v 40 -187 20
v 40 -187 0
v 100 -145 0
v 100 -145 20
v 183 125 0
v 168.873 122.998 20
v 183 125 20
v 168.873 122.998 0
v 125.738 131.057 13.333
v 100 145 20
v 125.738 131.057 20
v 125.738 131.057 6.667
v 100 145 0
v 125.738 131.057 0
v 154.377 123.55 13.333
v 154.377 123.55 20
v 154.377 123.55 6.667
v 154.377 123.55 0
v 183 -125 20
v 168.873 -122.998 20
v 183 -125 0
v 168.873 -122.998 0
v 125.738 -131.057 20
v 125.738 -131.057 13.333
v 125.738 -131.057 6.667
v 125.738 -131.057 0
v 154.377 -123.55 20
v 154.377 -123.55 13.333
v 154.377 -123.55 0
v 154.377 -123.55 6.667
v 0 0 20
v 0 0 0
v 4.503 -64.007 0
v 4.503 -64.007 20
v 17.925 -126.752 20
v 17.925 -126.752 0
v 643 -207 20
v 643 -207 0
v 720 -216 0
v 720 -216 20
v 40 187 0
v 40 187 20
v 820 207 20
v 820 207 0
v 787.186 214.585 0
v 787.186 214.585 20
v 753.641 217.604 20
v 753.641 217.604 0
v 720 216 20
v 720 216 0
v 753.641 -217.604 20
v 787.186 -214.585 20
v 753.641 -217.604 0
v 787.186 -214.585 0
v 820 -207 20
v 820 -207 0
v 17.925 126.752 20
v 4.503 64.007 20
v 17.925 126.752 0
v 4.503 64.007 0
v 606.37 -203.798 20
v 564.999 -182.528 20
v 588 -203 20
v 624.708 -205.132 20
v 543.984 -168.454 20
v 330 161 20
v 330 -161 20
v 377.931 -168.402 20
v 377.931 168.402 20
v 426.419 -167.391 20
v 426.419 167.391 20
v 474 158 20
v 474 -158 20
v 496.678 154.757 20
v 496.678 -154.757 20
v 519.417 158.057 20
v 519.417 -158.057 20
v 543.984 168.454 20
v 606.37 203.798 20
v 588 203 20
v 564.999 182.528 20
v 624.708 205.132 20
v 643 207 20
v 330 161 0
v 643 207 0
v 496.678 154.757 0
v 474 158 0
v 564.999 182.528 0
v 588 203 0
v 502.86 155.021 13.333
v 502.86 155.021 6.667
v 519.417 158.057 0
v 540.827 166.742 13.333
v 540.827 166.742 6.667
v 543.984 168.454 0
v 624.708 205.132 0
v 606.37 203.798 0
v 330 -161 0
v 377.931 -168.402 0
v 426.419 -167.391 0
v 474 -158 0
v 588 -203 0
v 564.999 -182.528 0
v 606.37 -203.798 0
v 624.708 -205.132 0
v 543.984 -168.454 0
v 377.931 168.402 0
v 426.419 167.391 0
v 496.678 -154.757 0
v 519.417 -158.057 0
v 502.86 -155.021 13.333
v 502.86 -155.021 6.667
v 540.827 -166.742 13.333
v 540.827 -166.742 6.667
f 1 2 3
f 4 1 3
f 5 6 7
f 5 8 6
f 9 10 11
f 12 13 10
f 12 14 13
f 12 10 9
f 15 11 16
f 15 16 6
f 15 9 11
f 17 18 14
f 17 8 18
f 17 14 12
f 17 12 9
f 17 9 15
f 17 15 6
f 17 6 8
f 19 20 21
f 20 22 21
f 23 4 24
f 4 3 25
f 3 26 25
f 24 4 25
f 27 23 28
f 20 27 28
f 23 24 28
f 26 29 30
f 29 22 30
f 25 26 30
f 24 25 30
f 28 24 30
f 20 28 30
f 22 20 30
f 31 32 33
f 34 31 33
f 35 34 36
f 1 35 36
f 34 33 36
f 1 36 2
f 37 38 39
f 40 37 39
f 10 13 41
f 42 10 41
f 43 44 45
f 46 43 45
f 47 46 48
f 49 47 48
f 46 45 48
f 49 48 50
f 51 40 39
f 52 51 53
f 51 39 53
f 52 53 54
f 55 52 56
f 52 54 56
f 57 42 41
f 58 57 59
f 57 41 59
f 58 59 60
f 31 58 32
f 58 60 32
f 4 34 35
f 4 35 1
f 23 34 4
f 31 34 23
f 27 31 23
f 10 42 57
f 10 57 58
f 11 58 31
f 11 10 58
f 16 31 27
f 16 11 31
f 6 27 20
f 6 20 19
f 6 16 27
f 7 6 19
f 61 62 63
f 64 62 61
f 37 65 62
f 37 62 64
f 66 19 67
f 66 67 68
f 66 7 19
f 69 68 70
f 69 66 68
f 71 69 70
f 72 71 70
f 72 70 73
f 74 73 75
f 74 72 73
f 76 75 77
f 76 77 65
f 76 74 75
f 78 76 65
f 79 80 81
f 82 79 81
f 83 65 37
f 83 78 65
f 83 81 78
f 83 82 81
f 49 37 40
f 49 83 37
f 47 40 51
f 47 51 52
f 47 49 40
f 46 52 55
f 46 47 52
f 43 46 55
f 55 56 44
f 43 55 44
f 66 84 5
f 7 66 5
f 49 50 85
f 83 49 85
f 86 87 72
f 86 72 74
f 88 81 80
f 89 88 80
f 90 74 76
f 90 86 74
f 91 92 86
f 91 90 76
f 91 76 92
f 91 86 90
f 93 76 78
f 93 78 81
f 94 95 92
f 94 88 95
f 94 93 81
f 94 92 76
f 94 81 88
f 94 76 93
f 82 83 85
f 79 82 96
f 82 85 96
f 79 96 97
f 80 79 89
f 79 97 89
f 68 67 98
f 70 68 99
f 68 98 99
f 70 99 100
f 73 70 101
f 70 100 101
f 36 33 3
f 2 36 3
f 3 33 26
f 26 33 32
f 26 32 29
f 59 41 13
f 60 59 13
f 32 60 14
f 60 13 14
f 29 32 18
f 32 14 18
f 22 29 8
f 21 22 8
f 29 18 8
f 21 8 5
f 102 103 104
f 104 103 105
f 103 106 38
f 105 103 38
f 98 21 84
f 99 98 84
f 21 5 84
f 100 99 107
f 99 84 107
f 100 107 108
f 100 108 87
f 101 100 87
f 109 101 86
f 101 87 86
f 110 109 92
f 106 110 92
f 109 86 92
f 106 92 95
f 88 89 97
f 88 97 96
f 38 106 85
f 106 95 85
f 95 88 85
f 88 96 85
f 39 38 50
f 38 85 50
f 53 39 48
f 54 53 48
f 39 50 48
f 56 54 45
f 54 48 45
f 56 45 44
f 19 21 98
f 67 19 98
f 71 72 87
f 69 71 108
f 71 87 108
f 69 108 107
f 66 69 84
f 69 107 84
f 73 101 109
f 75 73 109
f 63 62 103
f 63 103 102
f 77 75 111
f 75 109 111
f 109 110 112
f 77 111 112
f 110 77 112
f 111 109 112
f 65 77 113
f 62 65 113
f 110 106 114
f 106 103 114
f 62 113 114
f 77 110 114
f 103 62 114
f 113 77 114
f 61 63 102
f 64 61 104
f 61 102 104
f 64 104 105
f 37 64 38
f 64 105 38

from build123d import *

# Parameters (mm, degrees)
F1_DEPTH = 20


with BuildPart() as f1:
    # F0 (on Top) → F1 (new body)
    with BuildSketch(Plane.XY):
        with BuildLine():
            ThreePointArc((40, 187), (10.111843, 95.615114), (0, 0))
            Line((0, 0), (100, 0))
            Line((100, 0), (100, 145))
            Line((100, 145), (40, 187))
        make_face()
        with BuildLine():
            Line((100, 0), (0, 0))
            ThreePointArc((0, 0), (10.111843, -95.615114), (40, -187))
            Line((40, -187), (100, -145))
            Line((100, -145), (100, 0))
        make_face()
        with BuildLine():
            Line((100, 145), (100, 0))
            Line((100, 0), (183, 0))
            Line((183, 0), (183, 125))
            add(Edge.make_bspline(
                [(100, 145), (123.31415, 128.680095), (155.358294, 118.230603), (183, 125)],
                knots=[0, 0, 0, 0, 85.375641, 85.375641, 85.375641, 85.375641], degree=3))
        make_face()
        with BuildLine():
            Line((183, 0), (100, 0))
            Line((100, 0), (100, -145))
            add(Edge.make_bspline(
                [(100, -145), (123.31415, -128.680095), (155.358294, -118.230603), (183, -125)],
                knots=[0, 0, 0, 0, 85.375641, 85.375641, 85.375641, 85.375641], degree=3))
            Line((183, -125), (183, 0))
        make_face()
        Polygon((183, 125), (183, 0), (330, 0), (330, 161), align=None)
        Polygon((330, 0), (183, 0), (183, -125), (330, -161), align=None)
        with BuildLine():
            Line((330, 161), (330, 0))
            Line((330, 0), (474, 0))
            Line((474, 0), (474, 158))
            ThreePointArc((474, 158), (402.196918, 168.952057), (330, 161))
        make_face()
        with BuildLine():
            Line((474, 0), (330, 0))
            Line((330, 0), (330, -161))
            ThreePointArc((330, -161), (402.196918, -168.952057), (474, -158))
            Line((474, -158), (474, 0))
        make_face()
        with BuildLine():
            Line((474, 158), (474, 0))
            Line((474, 0), (587.999996, 0))
            Line((587.999996, 0), (587.999996, 203))
            add(Edge.make_bspline(
                [(474, 158), (498.337581, 150.951675), (536.193063, 151.193067), (587.999996, 203)],
                knots=[0, 0, 0, 0, 122.560186, 122.560186, 122.560186, 122.560186], degree=3))
        make_face()
        with BuildLine():
            Line((587.999996, 0), (474, 0))
            Line((474, 0), (474, -158))
            add(Edge.make_bspline(
                [(474, -158), (498.337581, -150.951675), (536.193063, -151.193067), (587.999996, -203)],
                knots=[0, 0, 0, 0, 122.560186, 122.560186, 122.560186, 122.560186], degree=3))
            Line((587.999996, -203), (587.999996, 0))
        make_face()
        with BuildLine():
            Line((587.999996, 203), (587.999996, 0))
            Line((587.999996, 0), (642.999996, 0))
            Line((642.999996, 0), (642.999996, 207))
            ThreePointArc((642.999996, 207), (615.543759, 204.398263), (587.999996, 203))
        make_face()
        with BuildLine():
            Line((642.999996, 0), (587.999996, 0))
            Line((587.999996, 0), (587.999996, -203))
            ThreePointArc((587.999996, -203), (615.543759, -204.398263), (642.999996, -207))
            Line((642.999996, -207), (642.999996, 0))
        make_face()
        Polygon((642.999996, 207), (642.999996, 0), (720.000004, 0), (720.000004, 216), align=None)
        Polygon((720.000004, 0), (642.999996, 0), (642.999996, -207), (720.000004, -216), align=None)
        with BuildLine():
            Line((720.000004, 216), (720.000004, 0))
            Line((720.000004, 0), (820, 0))
            Line((820, 0), (820, 207))
            ThreePointArc((820, 207), (770.465406, 216.671153), (720.000004, 216))
        make_face()
        with BuildLine():
            Line((820, 0), (720.000004, 0))
            Line((720.000004, 0), (720.000004, -216))
            ThreePointArc((720.000004, -216), (770.465406, -216.671153), (820, -207))
            Line((820, -207), (820, 0))
        make_face()
    extrude(amount=F1_DEPTH)


solid = f1.part
